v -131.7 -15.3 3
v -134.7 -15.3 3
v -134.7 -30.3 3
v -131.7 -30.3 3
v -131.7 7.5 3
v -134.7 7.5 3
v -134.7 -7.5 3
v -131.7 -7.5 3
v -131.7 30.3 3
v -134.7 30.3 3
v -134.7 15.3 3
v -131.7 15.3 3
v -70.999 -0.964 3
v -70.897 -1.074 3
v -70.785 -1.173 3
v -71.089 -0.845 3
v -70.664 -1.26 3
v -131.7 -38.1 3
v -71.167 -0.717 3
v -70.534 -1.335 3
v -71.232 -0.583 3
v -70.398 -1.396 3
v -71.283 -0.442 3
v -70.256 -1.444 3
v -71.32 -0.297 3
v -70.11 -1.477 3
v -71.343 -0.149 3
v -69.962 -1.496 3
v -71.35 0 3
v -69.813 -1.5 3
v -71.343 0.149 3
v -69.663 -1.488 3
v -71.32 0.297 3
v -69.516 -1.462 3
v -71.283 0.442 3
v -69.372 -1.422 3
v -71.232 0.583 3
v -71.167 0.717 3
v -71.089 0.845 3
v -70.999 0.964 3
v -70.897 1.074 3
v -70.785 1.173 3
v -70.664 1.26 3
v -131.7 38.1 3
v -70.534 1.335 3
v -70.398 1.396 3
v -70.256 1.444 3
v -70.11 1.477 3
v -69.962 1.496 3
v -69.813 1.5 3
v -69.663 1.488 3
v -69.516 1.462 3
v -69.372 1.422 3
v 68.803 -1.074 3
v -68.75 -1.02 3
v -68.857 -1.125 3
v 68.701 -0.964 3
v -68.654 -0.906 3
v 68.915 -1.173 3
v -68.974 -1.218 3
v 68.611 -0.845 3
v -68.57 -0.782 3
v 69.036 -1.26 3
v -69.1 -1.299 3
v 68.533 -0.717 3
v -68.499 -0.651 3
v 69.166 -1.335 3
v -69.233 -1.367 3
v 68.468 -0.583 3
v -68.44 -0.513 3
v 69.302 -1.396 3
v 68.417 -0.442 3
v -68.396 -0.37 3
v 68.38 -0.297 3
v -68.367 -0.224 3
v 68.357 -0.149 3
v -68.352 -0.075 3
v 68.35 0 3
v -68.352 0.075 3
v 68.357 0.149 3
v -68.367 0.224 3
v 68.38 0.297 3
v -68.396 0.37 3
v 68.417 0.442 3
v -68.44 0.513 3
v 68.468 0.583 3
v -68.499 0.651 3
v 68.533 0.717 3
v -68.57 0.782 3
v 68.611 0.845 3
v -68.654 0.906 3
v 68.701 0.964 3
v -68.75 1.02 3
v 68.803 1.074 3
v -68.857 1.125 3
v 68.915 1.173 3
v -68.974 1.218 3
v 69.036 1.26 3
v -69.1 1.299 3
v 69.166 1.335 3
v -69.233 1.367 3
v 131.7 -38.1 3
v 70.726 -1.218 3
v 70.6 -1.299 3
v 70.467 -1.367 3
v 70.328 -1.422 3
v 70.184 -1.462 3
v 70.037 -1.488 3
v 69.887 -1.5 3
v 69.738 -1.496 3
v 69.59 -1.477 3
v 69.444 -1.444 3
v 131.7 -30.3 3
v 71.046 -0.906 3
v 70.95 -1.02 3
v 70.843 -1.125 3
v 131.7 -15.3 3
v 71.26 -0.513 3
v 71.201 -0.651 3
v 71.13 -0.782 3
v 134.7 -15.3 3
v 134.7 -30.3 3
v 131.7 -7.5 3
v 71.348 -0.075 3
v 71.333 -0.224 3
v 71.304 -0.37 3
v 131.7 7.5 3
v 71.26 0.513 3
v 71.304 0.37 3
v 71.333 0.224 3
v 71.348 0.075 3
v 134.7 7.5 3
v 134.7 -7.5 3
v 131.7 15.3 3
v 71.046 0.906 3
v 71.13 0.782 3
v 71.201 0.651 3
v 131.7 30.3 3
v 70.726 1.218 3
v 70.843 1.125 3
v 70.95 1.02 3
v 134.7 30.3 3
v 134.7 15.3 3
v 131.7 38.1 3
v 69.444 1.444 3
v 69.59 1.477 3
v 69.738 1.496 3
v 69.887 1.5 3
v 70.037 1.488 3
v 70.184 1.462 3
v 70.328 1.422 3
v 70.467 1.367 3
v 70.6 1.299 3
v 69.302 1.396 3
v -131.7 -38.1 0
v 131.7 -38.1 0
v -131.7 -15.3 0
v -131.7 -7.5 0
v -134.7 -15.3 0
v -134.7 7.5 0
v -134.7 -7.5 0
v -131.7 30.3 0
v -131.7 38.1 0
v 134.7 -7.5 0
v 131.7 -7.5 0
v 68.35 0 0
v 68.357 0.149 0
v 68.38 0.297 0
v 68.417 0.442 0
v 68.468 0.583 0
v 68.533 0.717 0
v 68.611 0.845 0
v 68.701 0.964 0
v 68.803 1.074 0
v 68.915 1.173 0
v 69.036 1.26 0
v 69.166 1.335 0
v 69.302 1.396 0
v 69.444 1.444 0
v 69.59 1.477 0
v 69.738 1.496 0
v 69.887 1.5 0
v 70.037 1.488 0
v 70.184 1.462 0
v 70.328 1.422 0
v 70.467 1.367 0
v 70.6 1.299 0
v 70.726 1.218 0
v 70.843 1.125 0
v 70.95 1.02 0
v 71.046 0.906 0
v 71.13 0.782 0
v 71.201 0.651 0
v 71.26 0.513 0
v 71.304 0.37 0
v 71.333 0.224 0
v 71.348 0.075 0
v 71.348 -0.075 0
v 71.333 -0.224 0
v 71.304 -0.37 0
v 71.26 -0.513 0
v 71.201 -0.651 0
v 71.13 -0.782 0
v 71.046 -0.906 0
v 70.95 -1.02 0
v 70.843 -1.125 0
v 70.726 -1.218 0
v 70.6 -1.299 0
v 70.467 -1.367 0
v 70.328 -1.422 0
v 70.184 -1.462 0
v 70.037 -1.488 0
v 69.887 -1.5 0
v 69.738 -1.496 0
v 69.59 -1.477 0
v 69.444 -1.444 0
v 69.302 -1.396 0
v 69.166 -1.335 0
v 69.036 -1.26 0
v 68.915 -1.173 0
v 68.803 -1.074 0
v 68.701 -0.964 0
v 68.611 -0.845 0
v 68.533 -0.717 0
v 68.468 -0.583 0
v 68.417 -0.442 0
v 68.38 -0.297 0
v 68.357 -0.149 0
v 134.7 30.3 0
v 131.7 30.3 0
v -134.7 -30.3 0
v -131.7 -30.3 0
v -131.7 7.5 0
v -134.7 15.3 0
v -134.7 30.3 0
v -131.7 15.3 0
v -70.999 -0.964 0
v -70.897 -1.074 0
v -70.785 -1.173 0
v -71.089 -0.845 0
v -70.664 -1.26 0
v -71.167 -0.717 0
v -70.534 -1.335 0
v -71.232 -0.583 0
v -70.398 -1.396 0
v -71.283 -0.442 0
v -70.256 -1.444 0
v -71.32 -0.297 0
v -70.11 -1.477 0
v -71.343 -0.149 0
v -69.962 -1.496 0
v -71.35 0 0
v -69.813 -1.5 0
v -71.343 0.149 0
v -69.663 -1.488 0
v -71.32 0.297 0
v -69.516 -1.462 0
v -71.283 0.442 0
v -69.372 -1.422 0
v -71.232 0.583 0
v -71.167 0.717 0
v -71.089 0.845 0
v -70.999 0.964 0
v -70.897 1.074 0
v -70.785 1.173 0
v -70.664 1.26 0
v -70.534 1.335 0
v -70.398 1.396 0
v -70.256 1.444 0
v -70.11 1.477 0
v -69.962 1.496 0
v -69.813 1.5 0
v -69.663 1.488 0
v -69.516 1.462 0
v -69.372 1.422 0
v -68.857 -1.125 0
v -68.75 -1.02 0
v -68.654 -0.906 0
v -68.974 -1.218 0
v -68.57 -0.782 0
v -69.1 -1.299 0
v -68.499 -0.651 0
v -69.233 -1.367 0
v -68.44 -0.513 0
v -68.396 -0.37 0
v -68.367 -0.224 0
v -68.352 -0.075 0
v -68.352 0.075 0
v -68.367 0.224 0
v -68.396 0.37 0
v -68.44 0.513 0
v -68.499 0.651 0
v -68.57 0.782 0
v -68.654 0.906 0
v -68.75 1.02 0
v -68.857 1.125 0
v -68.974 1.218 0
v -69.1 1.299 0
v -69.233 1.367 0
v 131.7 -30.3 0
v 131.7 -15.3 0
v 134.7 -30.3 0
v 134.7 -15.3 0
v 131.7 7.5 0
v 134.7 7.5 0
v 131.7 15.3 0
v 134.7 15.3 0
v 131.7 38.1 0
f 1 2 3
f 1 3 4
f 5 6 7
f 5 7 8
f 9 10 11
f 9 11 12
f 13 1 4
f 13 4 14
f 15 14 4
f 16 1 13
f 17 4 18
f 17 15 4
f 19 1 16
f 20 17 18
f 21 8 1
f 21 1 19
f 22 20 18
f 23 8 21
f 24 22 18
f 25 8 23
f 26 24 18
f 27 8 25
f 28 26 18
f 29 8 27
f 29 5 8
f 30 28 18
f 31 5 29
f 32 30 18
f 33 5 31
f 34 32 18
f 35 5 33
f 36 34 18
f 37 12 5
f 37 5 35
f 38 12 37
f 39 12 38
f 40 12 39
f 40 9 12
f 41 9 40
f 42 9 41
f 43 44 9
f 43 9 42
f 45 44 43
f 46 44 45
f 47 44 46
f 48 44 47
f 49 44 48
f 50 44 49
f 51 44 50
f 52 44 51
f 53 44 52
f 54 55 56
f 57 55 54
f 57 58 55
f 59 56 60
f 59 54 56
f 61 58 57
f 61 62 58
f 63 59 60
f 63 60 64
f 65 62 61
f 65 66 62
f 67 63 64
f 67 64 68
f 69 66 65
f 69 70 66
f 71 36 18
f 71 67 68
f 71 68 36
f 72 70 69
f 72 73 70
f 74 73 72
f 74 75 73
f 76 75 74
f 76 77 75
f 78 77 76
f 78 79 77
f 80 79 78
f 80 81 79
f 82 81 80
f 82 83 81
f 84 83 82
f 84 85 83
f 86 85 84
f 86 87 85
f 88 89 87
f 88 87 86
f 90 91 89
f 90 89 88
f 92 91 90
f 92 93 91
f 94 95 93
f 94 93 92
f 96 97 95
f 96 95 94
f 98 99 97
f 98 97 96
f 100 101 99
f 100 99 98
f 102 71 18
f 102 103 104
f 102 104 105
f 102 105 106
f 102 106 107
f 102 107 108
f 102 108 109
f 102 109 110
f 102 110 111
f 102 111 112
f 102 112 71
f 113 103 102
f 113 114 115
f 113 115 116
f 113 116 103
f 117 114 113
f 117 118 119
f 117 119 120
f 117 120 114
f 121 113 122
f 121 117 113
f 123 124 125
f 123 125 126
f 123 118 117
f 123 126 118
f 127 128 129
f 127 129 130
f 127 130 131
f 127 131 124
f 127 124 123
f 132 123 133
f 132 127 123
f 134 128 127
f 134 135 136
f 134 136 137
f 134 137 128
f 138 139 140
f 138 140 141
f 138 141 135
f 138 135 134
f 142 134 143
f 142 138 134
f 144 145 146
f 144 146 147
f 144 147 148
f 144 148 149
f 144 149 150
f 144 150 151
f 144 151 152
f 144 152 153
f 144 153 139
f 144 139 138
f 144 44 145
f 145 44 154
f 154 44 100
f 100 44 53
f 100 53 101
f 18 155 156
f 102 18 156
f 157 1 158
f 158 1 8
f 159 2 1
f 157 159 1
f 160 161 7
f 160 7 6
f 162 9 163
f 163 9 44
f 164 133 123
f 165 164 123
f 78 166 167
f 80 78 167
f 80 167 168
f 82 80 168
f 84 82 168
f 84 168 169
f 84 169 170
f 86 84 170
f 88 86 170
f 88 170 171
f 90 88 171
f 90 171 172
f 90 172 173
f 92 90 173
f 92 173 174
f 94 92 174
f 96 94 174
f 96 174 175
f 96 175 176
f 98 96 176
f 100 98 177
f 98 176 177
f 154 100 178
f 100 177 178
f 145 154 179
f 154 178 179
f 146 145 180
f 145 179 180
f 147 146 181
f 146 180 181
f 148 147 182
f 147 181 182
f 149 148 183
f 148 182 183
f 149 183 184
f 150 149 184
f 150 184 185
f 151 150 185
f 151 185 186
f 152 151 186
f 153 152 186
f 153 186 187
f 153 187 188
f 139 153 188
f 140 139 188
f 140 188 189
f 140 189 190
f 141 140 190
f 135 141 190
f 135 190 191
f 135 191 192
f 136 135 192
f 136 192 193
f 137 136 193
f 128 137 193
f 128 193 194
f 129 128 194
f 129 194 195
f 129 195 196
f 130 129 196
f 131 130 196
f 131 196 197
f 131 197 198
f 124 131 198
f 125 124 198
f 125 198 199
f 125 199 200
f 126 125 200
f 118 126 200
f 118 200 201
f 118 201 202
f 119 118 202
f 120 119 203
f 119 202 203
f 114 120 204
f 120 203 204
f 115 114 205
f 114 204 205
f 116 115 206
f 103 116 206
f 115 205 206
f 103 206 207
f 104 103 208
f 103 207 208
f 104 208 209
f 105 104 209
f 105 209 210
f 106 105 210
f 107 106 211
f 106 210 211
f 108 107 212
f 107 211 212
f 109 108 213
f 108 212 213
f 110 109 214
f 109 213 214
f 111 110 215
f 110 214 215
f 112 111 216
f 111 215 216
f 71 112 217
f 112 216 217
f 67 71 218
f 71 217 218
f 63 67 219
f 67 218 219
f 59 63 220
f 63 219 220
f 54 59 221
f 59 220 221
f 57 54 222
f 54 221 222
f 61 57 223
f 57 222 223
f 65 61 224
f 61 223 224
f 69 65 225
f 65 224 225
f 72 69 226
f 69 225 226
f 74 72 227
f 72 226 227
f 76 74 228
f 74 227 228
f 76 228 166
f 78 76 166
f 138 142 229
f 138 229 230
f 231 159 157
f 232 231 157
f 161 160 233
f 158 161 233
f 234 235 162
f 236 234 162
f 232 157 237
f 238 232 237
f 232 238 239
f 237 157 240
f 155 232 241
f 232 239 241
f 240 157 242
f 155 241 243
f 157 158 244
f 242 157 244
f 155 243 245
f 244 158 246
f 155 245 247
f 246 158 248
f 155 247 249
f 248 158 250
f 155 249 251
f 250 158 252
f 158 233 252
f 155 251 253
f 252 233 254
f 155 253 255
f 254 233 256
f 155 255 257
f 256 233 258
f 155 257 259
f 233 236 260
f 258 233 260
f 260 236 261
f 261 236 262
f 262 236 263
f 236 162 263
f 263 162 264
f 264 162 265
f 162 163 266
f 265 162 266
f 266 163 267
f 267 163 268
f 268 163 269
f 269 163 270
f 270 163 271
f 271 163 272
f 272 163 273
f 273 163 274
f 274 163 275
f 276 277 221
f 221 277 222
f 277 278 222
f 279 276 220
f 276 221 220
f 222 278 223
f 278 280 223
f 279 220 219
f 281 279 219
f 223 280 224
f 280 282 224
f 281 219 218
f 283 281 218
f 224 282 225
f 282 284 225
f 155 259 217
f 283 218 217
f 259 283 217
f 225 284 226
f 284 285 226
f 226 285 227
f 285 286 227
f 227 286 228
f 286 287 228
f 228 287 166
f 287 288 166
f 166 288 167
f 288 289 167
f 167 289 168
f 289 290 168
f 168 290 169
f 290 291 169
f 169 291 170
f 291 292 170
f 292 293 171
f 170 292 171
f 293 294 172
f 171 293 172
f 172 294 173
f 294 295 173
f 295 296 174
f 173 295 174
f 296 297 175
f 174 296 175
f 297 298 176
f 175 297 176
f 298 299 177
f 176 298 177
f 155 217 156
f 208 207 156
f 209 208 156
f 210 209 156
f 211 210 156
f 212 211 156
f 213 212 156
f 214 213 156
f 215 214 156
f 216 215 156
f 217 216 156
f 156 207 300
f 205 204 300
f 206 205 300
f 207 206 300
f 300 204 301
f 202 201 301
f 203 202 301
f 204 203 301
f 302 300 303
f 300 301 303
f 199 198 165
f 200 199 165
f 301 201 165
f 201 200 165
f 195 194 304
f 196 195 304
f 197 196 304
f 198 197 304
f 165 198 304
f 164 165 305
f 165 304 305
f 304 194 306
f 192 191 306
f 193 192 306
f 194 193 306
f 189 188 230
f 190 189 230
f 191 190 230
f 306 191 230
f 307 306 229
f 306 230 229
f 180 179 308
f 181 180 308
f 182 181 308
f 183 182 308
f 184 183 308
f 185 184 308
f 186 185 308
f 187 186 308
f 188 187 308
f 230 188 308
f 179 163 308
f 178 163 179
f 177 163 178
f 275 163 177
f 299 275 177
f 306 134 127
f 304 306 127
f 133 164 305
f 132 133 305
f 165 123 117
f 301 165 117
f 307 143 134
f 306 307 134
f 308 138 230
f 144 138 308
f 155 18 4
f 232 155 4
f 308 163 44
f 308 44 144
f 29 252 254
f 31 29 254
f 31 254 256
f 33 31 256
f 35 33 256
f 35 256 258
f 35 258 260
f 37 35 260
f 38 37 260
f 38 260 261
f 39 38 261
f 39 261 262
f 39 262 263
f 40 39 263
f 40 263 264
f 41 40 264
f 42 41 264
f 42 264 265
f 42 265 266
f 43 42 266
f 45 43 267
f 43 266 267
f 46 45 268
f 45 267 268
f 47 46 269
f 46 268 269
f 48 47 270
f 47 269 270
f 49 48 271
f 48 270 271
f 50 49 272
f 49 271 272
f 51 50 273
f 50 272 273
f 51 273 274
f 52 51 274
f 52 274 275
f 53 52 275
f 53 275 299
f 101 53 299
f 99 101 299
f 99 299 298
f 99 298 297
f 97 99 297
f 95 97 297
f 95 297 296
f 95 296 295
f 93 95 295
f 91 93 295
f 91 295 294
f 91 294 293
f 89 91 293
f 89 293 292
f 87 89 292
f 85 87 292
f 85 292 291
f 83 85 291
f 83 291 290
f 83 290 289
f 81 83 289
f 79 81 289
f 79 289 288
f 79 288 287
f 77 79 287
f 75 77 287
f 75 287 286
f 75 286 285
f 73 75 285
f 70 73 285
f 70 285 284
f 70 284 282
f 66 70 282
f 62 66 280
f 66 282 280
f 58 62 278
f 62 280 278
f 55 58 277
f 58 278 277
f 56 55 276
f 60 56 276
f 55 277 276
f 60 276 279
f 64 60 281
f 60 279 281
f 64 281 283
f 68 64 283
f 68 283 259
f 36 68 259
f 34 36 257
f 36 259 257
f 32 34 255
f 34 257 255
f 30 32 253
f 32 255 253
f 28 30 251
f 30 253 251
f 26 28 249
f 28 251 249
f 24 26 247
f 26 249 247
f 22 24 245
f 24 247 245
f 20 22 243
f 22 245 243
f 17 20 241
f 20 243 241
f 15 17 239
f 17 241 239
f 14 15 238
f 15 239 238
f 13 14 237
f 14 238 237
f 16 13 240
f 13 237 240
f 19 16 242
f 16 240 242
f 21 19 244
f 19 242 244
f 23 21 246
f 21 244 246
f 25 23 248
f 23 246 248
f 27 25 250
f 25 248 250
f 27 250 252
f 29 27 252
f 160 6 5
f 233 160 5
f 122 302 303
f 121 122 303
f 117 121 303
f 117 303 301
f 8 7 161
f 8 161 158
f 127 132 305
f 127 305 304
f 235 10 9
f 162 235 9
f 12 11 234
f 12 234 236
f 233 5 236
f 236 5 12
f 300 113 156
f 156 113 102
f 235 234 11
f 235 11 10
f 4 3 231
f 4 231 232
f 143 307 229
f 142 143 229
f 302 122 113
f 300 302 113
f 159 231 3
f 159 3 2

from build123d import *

# Parameters (mm, degrees)
SKETCH1_W                       = 269.4
SKETCH1_H                       = 76.2
BOSS_EXTRUDE1_DEPTH             = 3
SKETCH2_W                       = 3
SKETCH2_H                       = 7.8
CUT_EXTRUDE1_DEPTH              = 141.016784708
LPATTERN1_COUNT                 = 4
LPATTERN1_PITCH                 = 22.8
MIRROR1_COPY_1_SKETCH_W         = 3
MIRROR1_COPY_1_SKETCH_H         = 7.8
MIRROR1_COPY_1_DEPTH            = 141.016784708
MIRROR1_COPY_2_SKETCH_W         = 3
MIRROR1_COPY_2_SKETCH_H         = 7.8
MIRROR1_COPY_2_DEPTH            = 141.016784708
MIRROR1_COPY_3_SKETCH_W         = 3
MIRROR1_COPY_3_SKETCH_H         = 7.8
MIRROR1_COPY_3_DEPTH            = 141.016784708
F_3_0MM_CLEARANCE_DOWEL_HOLE1_D = 3


with BuildPart() as part:
    # Sketch1 → Boss-Extrude1 (new body)
    with BuildSketch(Plane.XY):
        Rectangle(SKETCH1_W, SKETCH1_H)
    extrude(amount=BOSS_EXTRUDE1_DEPTH)

    # Sketch2 → Cut-Extrude1 (cut, through all)
    with BuildSketch(Plane.XY.offset(3)):
        with Locations((-133.2, 34.2)):
            Rectangle(SKETCH2_W, SKETCH2_H)
    cut_extrude1 = extrude(amount=-CUT_EXTRUDE1_DEPTH, mode=Mode.SUBTRACT)

    # LPattern1: Cut-Extrude1 ×4
    with Locations(*[(0, -i * LPATTERN1_PITCH, 0) for i in range(1, LPATTERN1_COUNT)]):
        add(cut_extrude1, mode=Mode.SUBTRACT)

    # Mirror1: Cut-Extrude1 across plane
    add(cut_extrude1.mirror(Plane(origin=(0, 0, 0), x_dir=(0, 0, 1), z_dir=(1, 0, 0))), mode=Mode.SUBTRACT)

    # Mirror1 copy 1 sketch → Mirror1 copy 1 (cut, through all)
    with BuildSketch(Plane(origin=(0, -22.8, 3), x_dir=(-1, 0, 0), z_dir=(0, 0, 1))):
        with Locations((-133.2, -34.2)):
            Rectangle(MIRROR1_COPY_1_SKETCH_W, MIRROR1_COPY_1_SKETCH_H)
    extrude(amount=-MIRROR1_COPY_1_DEPTH, mode=Mode.SUBTRACT)

    # Mirror1 copy 2 sketch → Mirror1 copy 2 (cut, through all)
    with BuildSketch(Plane(origin=(0, -45.6, 3), x_dir=(-1, 0, 0), z_dir=(0, 0, 1))):
        with Locations((-133.2, -34.2)):
            Rectangle(MIRROR1_COPY_2_SKETCH_W, MIRROR1_COPY_2_SKETCH_H)
    extrude(amount=-MIRROR1_COPY_2_DEPTH, mode=Mode.SUBTRACT)

    # Mirror1 copy 3 sketch → Mirror1 copy 3 (cut, through all)
    with BuildSketch(Plane(origin=(0, -68.4, 3), x_dir=(-1, 0, 0), z_dir=(0, 0, 1))):
        with Locations((-133.2, -34.2)):
            Rectangle(MIRROR1_COPY_3_SKETCH_W, MIRROR1_COPY_3_SKETCH_H)
    extrude(amount=-MIRROR1_COPY_3_DEPTH, mode=Mode.SUBTRACT)

    # Ø3.0mm Clearance Dowel Hole1 (through all)
    with Locations(Plane.XY.offset(3)):
        with Locations((-69.85, 0), (69.85, 0)):
            Hole(F_3_0MM_CLEARANCE_DOWEL_HOLE1_D / 2)


solid = part.part
